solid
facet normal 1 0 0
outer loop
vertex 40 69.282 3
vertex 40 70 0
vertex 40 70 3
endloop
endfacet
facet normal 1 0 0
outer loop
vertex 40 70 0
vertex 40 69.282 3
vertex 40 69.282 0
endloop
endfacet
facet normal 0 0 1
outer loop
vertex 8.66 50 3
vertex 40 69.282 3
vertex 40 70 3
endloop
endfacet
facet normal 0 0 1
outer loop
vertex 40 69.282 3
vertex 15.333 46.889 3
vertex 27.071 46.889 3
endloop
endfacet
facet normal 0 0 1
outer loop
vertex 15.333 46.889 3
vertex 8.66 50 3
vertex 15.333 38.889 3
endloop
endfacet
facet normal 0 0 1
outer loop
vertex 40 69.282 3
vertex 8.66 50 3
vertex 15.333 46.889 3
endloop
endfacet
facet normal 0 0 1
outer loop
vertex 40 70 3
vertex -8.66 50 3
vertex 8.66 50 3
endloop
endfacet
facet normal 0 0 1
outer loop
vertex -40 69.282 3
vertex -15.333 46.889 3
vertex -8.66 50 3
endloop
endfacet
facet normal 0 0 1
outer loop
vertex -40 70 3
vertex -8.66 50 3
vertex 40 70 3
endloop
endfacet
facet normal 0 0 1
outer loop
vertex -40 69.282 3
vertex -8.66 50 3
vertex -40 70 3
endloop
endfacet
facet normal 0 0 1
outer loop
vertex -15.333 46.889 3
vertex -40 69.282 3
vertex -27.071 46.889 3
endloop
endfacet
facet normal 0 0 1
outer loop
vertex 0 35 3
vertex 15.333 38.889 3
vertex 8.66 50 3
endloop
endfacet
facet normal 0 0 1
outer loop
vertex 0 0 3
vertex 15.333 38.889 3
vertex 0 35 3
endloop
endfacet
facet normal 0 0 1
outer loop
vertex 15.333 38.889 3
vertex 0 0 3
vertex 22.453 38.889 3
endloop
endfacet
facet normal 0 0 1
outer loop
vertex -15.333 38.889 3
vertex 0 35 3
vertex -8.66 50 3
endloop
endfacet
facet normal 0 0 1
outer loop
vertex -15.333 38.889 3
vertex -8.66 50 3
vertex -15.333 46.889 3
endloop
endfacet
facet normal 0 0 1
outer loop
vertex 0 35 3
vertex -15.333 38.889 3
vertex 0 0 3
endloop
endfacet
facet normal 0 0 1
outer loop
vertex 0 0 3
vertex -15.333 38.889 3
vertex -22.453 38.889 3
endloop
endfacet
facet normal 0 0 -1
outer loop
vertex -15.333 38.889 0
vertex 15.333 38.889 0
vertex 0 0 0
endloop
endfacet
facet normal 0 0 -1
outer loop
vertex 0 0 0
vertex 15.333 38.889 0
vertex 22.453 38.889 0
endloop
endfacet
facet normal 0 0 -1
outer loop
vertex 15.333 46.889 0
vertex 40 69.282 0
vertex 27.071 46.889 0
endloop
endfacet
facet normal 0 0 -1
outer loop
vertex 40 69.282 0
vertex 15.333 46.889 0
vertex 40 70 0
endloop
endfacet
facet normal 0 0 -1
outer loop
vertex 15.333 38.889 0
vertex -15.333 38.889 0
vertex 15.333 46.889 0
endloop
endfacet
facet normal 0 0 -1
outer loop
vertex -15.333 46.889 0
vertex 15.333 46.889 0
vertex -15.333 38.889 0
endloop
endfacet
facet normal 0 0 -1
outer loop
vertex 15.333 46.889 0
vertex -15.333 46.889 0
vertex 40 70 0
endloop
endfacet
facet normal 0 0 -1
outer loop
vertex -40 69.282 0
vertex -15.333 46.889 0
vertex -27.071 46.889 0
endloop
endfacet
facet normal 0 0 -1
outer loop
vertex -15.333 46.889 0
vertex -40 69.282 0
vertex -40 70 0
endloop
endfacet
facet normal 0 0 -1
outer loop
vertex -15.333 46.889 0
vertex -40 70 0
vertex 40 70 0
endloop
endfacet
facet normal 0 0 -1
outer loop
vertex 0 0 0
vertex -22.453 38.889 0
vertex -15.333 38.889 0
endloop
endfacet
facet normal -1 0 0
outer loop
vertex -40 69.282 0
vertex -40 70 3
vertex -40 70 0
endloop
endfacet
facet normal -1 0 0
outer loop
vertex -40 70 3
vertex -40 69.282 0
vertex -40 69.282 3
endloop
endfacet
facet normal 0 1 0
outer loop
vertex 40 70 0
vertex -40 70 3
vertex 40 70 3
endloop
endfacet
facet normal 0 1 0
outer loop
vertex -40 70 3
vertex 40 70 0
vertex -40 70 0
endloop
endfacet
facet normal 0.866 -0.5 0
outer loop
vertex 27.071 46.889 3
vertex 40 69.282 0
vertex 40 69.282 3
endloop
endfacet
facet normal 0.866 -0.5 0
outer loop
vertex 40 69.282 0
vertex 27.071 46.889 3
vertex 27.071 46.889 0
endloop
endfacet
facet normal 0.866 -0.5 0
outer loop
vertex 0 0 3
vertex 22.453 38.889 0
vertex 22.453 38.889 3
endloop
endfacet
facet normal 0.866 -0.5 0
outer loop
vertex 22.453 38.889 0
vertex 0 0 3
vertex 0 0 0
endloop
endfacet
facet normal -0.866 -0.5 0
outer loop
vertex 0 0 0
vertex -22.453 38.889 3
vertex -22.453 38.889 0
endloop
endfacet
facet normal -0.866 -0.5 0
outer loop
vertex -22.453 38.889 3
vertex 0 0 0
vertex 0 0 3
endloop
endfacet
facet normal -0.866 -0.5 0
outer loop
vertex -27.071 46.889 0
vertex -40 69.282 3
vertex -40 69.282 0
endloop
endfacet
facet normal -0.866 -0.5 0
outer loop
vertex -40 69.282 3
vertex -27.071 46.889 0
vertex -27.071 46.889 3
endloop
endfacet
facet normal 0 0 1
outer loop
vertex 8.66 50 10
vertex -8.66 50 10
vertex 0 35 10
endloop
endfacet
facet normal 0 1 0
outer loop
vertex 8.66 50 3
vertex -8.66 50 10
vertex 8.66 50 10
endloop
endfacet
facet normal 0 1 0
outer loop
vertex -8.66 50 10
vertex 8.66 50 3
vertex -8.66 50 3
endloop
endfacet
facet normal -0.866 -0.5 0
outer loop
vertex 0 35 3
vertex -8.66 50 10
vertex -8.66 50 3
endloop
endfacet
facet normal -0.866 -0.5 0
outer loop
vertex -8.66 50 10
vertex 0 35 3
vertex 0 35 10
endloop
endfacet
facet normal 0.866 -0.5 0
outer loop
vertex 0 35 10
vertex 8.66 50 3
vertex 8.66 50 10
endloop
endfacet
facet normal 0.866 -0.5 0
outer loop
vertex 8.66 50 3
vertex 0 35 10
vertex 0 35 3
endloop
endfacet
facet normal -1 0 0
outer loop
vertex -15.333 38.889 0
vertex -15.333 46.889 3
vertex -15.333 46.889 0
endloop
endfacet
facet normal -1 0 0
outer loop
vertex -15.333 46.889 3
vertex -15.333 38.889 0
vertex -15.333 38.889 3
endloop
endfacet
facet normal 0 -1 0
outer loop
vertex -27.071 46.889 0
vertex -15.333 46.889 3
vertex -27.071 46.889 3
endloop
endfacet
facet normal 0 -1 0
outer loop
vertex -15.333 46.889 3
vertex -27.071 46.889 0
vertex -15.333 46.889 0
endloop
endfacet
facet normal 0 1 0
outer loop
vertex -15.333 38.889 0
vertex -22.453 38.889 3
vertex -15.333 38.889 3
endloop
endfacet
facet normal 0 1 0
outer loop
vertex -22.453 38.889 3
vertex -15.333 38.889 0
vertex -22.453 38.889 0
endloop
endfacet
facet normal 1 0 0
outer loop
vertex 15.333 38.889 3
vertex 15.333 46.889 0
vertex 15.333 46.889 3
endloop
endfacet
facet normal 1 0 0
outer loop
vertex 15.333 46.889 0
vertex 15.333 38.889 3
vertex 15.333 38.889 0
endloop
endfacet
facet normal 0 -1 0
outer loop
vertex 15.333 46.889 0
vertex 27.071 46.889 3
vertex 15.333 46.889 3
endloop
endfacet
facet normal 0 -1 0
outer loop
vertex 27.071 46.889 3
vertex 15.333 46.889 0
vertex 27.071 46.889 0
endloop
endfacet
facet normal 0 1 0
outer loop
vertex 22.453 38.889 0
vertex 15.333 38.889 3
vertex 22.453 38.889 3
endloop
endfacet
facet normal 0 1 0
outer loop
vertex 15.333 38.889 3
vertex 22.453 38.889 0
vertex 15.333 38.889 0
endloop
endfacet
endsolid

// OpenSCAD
// file: chuck.scad
include <../params.scad>


chuck_edge = coil_edge/2;

module chuck_whole() {
  difference() {
    translate([chuck_edge/-2, 0, 0])
      cube([chuck_edge, chuck_edge/1.2, stator_height]);
    rotate([0, 0, 120]) cube([chuck_edge, chuck_edge, stator_height]);
    mirror([0, 1, 0]) {
      rotate([0, 0, 300]) cube([chuck_edge, chuck_edge, stator_height]);
    }
  }
}

module chuck() {
  difference() {
    chuck_whole();
    translate([0, chuck_edge/4, 0]) scale([0.5, 0.5, 1]) chuck_whole();
    translate([chuck_edge/-2, chuck_edge/2, stator_height/2]) {
      rotate([90, 0, 90]) cylinder(h=chuck_edge, r=1);
    }
  }
}

chuck();
// file: ../params.scad
// GLOBAL
hole_radius = 5;
peg_radius = 4.5;

// MAGNET
mag_height = 6.4;
mag_ring_ir = 50;
mag_ring_or = 102;
mag_count = 16;

// BEARING
bearing_height = 17;
bearing_ir = 33;
bearing_or = 44;

// STATOR
stator_height = 20;
stator_inner_height = 10;
stator_bearing_inset = (stator_height/2) - 1;
stator_count = 6;
stator_incidence = 360/stator_count;
stator_radius = 115;
stator_tab_width = 10;
stator_tab_offset = 50;
stator_wiring_gap = 25;
stator_wiring_gap_inset = stator_radius - (stator_wiring_gap + 10);
stator_outer_tab_extrude = 15;
stator_outer_tab_width = 30;
stator_notch = 15;
stator_notch_width = 5;
coil_edge = 80;
coil_block_length = 70;

// ROTOR & ROTOR CAP
rotor_height = 10;
rotor_inner_height = 3;
rotor_radius = 105;
rotor_inner_diameter = 25;
rotor_count = 8;
rotor_incidence = 360/rotor_count;
rotor_tie_hole_offset = 30;
rotor_notch = 10;
rotor_notch_height = 2;

rotor_cap_radius = 50;
rotor_cap_peg_radius = 35;
rotor_cap_inner_radius = 10;
rotor_cap_height = 10;
rotor_cap_insert_height = 10;
rotor_cap_bearing_inset = (bearing_height + rotor_inner_height) - rotor_cap_height;
rotor_plate_height = 5;
blade_holder_edge = 20;

// ROTOR EDGE TIE
rotor_edge_tie_length = 40;
rotor_edge_tie_width = 20;
rotor_edge_tie_inner_height = 5;
rotor_edge_tie_height = 20;
rotor_edge_tie_peg_inset = 10;
// main file
include <../params.scad>
use <chuck.scad>


module subtractor() {  
  translate([coil_edge/-2 - 2, coil_block_length/1.8, 0]) {
    cube([coil_edge/3, coil_edge/10, stator_height]);
  }
}

module support_whole() {
  difference() {
    translate([coil_edge/-2, 0, 0]) cube([coil_edge, coil_block_length, 3]);
    rotate([0, 0, -30])  cube([coil_edge/2, coil_edge, 3]);
    mirror([1, 0, 0]) {
      rotate([0, 0, -30])  cube([coil_edge/2, coil_edge, 3]);
    }
  }
  translate([0, coil_block_length/2, 0]) {
    scale([0.45, 0.45, 0.5]) chuck_whole();
  }
}

module support() {
  difference() {
    support_whole();
    subtractor();
    mirror([1, 0, 0]) subtractor();
  }
}

support();
